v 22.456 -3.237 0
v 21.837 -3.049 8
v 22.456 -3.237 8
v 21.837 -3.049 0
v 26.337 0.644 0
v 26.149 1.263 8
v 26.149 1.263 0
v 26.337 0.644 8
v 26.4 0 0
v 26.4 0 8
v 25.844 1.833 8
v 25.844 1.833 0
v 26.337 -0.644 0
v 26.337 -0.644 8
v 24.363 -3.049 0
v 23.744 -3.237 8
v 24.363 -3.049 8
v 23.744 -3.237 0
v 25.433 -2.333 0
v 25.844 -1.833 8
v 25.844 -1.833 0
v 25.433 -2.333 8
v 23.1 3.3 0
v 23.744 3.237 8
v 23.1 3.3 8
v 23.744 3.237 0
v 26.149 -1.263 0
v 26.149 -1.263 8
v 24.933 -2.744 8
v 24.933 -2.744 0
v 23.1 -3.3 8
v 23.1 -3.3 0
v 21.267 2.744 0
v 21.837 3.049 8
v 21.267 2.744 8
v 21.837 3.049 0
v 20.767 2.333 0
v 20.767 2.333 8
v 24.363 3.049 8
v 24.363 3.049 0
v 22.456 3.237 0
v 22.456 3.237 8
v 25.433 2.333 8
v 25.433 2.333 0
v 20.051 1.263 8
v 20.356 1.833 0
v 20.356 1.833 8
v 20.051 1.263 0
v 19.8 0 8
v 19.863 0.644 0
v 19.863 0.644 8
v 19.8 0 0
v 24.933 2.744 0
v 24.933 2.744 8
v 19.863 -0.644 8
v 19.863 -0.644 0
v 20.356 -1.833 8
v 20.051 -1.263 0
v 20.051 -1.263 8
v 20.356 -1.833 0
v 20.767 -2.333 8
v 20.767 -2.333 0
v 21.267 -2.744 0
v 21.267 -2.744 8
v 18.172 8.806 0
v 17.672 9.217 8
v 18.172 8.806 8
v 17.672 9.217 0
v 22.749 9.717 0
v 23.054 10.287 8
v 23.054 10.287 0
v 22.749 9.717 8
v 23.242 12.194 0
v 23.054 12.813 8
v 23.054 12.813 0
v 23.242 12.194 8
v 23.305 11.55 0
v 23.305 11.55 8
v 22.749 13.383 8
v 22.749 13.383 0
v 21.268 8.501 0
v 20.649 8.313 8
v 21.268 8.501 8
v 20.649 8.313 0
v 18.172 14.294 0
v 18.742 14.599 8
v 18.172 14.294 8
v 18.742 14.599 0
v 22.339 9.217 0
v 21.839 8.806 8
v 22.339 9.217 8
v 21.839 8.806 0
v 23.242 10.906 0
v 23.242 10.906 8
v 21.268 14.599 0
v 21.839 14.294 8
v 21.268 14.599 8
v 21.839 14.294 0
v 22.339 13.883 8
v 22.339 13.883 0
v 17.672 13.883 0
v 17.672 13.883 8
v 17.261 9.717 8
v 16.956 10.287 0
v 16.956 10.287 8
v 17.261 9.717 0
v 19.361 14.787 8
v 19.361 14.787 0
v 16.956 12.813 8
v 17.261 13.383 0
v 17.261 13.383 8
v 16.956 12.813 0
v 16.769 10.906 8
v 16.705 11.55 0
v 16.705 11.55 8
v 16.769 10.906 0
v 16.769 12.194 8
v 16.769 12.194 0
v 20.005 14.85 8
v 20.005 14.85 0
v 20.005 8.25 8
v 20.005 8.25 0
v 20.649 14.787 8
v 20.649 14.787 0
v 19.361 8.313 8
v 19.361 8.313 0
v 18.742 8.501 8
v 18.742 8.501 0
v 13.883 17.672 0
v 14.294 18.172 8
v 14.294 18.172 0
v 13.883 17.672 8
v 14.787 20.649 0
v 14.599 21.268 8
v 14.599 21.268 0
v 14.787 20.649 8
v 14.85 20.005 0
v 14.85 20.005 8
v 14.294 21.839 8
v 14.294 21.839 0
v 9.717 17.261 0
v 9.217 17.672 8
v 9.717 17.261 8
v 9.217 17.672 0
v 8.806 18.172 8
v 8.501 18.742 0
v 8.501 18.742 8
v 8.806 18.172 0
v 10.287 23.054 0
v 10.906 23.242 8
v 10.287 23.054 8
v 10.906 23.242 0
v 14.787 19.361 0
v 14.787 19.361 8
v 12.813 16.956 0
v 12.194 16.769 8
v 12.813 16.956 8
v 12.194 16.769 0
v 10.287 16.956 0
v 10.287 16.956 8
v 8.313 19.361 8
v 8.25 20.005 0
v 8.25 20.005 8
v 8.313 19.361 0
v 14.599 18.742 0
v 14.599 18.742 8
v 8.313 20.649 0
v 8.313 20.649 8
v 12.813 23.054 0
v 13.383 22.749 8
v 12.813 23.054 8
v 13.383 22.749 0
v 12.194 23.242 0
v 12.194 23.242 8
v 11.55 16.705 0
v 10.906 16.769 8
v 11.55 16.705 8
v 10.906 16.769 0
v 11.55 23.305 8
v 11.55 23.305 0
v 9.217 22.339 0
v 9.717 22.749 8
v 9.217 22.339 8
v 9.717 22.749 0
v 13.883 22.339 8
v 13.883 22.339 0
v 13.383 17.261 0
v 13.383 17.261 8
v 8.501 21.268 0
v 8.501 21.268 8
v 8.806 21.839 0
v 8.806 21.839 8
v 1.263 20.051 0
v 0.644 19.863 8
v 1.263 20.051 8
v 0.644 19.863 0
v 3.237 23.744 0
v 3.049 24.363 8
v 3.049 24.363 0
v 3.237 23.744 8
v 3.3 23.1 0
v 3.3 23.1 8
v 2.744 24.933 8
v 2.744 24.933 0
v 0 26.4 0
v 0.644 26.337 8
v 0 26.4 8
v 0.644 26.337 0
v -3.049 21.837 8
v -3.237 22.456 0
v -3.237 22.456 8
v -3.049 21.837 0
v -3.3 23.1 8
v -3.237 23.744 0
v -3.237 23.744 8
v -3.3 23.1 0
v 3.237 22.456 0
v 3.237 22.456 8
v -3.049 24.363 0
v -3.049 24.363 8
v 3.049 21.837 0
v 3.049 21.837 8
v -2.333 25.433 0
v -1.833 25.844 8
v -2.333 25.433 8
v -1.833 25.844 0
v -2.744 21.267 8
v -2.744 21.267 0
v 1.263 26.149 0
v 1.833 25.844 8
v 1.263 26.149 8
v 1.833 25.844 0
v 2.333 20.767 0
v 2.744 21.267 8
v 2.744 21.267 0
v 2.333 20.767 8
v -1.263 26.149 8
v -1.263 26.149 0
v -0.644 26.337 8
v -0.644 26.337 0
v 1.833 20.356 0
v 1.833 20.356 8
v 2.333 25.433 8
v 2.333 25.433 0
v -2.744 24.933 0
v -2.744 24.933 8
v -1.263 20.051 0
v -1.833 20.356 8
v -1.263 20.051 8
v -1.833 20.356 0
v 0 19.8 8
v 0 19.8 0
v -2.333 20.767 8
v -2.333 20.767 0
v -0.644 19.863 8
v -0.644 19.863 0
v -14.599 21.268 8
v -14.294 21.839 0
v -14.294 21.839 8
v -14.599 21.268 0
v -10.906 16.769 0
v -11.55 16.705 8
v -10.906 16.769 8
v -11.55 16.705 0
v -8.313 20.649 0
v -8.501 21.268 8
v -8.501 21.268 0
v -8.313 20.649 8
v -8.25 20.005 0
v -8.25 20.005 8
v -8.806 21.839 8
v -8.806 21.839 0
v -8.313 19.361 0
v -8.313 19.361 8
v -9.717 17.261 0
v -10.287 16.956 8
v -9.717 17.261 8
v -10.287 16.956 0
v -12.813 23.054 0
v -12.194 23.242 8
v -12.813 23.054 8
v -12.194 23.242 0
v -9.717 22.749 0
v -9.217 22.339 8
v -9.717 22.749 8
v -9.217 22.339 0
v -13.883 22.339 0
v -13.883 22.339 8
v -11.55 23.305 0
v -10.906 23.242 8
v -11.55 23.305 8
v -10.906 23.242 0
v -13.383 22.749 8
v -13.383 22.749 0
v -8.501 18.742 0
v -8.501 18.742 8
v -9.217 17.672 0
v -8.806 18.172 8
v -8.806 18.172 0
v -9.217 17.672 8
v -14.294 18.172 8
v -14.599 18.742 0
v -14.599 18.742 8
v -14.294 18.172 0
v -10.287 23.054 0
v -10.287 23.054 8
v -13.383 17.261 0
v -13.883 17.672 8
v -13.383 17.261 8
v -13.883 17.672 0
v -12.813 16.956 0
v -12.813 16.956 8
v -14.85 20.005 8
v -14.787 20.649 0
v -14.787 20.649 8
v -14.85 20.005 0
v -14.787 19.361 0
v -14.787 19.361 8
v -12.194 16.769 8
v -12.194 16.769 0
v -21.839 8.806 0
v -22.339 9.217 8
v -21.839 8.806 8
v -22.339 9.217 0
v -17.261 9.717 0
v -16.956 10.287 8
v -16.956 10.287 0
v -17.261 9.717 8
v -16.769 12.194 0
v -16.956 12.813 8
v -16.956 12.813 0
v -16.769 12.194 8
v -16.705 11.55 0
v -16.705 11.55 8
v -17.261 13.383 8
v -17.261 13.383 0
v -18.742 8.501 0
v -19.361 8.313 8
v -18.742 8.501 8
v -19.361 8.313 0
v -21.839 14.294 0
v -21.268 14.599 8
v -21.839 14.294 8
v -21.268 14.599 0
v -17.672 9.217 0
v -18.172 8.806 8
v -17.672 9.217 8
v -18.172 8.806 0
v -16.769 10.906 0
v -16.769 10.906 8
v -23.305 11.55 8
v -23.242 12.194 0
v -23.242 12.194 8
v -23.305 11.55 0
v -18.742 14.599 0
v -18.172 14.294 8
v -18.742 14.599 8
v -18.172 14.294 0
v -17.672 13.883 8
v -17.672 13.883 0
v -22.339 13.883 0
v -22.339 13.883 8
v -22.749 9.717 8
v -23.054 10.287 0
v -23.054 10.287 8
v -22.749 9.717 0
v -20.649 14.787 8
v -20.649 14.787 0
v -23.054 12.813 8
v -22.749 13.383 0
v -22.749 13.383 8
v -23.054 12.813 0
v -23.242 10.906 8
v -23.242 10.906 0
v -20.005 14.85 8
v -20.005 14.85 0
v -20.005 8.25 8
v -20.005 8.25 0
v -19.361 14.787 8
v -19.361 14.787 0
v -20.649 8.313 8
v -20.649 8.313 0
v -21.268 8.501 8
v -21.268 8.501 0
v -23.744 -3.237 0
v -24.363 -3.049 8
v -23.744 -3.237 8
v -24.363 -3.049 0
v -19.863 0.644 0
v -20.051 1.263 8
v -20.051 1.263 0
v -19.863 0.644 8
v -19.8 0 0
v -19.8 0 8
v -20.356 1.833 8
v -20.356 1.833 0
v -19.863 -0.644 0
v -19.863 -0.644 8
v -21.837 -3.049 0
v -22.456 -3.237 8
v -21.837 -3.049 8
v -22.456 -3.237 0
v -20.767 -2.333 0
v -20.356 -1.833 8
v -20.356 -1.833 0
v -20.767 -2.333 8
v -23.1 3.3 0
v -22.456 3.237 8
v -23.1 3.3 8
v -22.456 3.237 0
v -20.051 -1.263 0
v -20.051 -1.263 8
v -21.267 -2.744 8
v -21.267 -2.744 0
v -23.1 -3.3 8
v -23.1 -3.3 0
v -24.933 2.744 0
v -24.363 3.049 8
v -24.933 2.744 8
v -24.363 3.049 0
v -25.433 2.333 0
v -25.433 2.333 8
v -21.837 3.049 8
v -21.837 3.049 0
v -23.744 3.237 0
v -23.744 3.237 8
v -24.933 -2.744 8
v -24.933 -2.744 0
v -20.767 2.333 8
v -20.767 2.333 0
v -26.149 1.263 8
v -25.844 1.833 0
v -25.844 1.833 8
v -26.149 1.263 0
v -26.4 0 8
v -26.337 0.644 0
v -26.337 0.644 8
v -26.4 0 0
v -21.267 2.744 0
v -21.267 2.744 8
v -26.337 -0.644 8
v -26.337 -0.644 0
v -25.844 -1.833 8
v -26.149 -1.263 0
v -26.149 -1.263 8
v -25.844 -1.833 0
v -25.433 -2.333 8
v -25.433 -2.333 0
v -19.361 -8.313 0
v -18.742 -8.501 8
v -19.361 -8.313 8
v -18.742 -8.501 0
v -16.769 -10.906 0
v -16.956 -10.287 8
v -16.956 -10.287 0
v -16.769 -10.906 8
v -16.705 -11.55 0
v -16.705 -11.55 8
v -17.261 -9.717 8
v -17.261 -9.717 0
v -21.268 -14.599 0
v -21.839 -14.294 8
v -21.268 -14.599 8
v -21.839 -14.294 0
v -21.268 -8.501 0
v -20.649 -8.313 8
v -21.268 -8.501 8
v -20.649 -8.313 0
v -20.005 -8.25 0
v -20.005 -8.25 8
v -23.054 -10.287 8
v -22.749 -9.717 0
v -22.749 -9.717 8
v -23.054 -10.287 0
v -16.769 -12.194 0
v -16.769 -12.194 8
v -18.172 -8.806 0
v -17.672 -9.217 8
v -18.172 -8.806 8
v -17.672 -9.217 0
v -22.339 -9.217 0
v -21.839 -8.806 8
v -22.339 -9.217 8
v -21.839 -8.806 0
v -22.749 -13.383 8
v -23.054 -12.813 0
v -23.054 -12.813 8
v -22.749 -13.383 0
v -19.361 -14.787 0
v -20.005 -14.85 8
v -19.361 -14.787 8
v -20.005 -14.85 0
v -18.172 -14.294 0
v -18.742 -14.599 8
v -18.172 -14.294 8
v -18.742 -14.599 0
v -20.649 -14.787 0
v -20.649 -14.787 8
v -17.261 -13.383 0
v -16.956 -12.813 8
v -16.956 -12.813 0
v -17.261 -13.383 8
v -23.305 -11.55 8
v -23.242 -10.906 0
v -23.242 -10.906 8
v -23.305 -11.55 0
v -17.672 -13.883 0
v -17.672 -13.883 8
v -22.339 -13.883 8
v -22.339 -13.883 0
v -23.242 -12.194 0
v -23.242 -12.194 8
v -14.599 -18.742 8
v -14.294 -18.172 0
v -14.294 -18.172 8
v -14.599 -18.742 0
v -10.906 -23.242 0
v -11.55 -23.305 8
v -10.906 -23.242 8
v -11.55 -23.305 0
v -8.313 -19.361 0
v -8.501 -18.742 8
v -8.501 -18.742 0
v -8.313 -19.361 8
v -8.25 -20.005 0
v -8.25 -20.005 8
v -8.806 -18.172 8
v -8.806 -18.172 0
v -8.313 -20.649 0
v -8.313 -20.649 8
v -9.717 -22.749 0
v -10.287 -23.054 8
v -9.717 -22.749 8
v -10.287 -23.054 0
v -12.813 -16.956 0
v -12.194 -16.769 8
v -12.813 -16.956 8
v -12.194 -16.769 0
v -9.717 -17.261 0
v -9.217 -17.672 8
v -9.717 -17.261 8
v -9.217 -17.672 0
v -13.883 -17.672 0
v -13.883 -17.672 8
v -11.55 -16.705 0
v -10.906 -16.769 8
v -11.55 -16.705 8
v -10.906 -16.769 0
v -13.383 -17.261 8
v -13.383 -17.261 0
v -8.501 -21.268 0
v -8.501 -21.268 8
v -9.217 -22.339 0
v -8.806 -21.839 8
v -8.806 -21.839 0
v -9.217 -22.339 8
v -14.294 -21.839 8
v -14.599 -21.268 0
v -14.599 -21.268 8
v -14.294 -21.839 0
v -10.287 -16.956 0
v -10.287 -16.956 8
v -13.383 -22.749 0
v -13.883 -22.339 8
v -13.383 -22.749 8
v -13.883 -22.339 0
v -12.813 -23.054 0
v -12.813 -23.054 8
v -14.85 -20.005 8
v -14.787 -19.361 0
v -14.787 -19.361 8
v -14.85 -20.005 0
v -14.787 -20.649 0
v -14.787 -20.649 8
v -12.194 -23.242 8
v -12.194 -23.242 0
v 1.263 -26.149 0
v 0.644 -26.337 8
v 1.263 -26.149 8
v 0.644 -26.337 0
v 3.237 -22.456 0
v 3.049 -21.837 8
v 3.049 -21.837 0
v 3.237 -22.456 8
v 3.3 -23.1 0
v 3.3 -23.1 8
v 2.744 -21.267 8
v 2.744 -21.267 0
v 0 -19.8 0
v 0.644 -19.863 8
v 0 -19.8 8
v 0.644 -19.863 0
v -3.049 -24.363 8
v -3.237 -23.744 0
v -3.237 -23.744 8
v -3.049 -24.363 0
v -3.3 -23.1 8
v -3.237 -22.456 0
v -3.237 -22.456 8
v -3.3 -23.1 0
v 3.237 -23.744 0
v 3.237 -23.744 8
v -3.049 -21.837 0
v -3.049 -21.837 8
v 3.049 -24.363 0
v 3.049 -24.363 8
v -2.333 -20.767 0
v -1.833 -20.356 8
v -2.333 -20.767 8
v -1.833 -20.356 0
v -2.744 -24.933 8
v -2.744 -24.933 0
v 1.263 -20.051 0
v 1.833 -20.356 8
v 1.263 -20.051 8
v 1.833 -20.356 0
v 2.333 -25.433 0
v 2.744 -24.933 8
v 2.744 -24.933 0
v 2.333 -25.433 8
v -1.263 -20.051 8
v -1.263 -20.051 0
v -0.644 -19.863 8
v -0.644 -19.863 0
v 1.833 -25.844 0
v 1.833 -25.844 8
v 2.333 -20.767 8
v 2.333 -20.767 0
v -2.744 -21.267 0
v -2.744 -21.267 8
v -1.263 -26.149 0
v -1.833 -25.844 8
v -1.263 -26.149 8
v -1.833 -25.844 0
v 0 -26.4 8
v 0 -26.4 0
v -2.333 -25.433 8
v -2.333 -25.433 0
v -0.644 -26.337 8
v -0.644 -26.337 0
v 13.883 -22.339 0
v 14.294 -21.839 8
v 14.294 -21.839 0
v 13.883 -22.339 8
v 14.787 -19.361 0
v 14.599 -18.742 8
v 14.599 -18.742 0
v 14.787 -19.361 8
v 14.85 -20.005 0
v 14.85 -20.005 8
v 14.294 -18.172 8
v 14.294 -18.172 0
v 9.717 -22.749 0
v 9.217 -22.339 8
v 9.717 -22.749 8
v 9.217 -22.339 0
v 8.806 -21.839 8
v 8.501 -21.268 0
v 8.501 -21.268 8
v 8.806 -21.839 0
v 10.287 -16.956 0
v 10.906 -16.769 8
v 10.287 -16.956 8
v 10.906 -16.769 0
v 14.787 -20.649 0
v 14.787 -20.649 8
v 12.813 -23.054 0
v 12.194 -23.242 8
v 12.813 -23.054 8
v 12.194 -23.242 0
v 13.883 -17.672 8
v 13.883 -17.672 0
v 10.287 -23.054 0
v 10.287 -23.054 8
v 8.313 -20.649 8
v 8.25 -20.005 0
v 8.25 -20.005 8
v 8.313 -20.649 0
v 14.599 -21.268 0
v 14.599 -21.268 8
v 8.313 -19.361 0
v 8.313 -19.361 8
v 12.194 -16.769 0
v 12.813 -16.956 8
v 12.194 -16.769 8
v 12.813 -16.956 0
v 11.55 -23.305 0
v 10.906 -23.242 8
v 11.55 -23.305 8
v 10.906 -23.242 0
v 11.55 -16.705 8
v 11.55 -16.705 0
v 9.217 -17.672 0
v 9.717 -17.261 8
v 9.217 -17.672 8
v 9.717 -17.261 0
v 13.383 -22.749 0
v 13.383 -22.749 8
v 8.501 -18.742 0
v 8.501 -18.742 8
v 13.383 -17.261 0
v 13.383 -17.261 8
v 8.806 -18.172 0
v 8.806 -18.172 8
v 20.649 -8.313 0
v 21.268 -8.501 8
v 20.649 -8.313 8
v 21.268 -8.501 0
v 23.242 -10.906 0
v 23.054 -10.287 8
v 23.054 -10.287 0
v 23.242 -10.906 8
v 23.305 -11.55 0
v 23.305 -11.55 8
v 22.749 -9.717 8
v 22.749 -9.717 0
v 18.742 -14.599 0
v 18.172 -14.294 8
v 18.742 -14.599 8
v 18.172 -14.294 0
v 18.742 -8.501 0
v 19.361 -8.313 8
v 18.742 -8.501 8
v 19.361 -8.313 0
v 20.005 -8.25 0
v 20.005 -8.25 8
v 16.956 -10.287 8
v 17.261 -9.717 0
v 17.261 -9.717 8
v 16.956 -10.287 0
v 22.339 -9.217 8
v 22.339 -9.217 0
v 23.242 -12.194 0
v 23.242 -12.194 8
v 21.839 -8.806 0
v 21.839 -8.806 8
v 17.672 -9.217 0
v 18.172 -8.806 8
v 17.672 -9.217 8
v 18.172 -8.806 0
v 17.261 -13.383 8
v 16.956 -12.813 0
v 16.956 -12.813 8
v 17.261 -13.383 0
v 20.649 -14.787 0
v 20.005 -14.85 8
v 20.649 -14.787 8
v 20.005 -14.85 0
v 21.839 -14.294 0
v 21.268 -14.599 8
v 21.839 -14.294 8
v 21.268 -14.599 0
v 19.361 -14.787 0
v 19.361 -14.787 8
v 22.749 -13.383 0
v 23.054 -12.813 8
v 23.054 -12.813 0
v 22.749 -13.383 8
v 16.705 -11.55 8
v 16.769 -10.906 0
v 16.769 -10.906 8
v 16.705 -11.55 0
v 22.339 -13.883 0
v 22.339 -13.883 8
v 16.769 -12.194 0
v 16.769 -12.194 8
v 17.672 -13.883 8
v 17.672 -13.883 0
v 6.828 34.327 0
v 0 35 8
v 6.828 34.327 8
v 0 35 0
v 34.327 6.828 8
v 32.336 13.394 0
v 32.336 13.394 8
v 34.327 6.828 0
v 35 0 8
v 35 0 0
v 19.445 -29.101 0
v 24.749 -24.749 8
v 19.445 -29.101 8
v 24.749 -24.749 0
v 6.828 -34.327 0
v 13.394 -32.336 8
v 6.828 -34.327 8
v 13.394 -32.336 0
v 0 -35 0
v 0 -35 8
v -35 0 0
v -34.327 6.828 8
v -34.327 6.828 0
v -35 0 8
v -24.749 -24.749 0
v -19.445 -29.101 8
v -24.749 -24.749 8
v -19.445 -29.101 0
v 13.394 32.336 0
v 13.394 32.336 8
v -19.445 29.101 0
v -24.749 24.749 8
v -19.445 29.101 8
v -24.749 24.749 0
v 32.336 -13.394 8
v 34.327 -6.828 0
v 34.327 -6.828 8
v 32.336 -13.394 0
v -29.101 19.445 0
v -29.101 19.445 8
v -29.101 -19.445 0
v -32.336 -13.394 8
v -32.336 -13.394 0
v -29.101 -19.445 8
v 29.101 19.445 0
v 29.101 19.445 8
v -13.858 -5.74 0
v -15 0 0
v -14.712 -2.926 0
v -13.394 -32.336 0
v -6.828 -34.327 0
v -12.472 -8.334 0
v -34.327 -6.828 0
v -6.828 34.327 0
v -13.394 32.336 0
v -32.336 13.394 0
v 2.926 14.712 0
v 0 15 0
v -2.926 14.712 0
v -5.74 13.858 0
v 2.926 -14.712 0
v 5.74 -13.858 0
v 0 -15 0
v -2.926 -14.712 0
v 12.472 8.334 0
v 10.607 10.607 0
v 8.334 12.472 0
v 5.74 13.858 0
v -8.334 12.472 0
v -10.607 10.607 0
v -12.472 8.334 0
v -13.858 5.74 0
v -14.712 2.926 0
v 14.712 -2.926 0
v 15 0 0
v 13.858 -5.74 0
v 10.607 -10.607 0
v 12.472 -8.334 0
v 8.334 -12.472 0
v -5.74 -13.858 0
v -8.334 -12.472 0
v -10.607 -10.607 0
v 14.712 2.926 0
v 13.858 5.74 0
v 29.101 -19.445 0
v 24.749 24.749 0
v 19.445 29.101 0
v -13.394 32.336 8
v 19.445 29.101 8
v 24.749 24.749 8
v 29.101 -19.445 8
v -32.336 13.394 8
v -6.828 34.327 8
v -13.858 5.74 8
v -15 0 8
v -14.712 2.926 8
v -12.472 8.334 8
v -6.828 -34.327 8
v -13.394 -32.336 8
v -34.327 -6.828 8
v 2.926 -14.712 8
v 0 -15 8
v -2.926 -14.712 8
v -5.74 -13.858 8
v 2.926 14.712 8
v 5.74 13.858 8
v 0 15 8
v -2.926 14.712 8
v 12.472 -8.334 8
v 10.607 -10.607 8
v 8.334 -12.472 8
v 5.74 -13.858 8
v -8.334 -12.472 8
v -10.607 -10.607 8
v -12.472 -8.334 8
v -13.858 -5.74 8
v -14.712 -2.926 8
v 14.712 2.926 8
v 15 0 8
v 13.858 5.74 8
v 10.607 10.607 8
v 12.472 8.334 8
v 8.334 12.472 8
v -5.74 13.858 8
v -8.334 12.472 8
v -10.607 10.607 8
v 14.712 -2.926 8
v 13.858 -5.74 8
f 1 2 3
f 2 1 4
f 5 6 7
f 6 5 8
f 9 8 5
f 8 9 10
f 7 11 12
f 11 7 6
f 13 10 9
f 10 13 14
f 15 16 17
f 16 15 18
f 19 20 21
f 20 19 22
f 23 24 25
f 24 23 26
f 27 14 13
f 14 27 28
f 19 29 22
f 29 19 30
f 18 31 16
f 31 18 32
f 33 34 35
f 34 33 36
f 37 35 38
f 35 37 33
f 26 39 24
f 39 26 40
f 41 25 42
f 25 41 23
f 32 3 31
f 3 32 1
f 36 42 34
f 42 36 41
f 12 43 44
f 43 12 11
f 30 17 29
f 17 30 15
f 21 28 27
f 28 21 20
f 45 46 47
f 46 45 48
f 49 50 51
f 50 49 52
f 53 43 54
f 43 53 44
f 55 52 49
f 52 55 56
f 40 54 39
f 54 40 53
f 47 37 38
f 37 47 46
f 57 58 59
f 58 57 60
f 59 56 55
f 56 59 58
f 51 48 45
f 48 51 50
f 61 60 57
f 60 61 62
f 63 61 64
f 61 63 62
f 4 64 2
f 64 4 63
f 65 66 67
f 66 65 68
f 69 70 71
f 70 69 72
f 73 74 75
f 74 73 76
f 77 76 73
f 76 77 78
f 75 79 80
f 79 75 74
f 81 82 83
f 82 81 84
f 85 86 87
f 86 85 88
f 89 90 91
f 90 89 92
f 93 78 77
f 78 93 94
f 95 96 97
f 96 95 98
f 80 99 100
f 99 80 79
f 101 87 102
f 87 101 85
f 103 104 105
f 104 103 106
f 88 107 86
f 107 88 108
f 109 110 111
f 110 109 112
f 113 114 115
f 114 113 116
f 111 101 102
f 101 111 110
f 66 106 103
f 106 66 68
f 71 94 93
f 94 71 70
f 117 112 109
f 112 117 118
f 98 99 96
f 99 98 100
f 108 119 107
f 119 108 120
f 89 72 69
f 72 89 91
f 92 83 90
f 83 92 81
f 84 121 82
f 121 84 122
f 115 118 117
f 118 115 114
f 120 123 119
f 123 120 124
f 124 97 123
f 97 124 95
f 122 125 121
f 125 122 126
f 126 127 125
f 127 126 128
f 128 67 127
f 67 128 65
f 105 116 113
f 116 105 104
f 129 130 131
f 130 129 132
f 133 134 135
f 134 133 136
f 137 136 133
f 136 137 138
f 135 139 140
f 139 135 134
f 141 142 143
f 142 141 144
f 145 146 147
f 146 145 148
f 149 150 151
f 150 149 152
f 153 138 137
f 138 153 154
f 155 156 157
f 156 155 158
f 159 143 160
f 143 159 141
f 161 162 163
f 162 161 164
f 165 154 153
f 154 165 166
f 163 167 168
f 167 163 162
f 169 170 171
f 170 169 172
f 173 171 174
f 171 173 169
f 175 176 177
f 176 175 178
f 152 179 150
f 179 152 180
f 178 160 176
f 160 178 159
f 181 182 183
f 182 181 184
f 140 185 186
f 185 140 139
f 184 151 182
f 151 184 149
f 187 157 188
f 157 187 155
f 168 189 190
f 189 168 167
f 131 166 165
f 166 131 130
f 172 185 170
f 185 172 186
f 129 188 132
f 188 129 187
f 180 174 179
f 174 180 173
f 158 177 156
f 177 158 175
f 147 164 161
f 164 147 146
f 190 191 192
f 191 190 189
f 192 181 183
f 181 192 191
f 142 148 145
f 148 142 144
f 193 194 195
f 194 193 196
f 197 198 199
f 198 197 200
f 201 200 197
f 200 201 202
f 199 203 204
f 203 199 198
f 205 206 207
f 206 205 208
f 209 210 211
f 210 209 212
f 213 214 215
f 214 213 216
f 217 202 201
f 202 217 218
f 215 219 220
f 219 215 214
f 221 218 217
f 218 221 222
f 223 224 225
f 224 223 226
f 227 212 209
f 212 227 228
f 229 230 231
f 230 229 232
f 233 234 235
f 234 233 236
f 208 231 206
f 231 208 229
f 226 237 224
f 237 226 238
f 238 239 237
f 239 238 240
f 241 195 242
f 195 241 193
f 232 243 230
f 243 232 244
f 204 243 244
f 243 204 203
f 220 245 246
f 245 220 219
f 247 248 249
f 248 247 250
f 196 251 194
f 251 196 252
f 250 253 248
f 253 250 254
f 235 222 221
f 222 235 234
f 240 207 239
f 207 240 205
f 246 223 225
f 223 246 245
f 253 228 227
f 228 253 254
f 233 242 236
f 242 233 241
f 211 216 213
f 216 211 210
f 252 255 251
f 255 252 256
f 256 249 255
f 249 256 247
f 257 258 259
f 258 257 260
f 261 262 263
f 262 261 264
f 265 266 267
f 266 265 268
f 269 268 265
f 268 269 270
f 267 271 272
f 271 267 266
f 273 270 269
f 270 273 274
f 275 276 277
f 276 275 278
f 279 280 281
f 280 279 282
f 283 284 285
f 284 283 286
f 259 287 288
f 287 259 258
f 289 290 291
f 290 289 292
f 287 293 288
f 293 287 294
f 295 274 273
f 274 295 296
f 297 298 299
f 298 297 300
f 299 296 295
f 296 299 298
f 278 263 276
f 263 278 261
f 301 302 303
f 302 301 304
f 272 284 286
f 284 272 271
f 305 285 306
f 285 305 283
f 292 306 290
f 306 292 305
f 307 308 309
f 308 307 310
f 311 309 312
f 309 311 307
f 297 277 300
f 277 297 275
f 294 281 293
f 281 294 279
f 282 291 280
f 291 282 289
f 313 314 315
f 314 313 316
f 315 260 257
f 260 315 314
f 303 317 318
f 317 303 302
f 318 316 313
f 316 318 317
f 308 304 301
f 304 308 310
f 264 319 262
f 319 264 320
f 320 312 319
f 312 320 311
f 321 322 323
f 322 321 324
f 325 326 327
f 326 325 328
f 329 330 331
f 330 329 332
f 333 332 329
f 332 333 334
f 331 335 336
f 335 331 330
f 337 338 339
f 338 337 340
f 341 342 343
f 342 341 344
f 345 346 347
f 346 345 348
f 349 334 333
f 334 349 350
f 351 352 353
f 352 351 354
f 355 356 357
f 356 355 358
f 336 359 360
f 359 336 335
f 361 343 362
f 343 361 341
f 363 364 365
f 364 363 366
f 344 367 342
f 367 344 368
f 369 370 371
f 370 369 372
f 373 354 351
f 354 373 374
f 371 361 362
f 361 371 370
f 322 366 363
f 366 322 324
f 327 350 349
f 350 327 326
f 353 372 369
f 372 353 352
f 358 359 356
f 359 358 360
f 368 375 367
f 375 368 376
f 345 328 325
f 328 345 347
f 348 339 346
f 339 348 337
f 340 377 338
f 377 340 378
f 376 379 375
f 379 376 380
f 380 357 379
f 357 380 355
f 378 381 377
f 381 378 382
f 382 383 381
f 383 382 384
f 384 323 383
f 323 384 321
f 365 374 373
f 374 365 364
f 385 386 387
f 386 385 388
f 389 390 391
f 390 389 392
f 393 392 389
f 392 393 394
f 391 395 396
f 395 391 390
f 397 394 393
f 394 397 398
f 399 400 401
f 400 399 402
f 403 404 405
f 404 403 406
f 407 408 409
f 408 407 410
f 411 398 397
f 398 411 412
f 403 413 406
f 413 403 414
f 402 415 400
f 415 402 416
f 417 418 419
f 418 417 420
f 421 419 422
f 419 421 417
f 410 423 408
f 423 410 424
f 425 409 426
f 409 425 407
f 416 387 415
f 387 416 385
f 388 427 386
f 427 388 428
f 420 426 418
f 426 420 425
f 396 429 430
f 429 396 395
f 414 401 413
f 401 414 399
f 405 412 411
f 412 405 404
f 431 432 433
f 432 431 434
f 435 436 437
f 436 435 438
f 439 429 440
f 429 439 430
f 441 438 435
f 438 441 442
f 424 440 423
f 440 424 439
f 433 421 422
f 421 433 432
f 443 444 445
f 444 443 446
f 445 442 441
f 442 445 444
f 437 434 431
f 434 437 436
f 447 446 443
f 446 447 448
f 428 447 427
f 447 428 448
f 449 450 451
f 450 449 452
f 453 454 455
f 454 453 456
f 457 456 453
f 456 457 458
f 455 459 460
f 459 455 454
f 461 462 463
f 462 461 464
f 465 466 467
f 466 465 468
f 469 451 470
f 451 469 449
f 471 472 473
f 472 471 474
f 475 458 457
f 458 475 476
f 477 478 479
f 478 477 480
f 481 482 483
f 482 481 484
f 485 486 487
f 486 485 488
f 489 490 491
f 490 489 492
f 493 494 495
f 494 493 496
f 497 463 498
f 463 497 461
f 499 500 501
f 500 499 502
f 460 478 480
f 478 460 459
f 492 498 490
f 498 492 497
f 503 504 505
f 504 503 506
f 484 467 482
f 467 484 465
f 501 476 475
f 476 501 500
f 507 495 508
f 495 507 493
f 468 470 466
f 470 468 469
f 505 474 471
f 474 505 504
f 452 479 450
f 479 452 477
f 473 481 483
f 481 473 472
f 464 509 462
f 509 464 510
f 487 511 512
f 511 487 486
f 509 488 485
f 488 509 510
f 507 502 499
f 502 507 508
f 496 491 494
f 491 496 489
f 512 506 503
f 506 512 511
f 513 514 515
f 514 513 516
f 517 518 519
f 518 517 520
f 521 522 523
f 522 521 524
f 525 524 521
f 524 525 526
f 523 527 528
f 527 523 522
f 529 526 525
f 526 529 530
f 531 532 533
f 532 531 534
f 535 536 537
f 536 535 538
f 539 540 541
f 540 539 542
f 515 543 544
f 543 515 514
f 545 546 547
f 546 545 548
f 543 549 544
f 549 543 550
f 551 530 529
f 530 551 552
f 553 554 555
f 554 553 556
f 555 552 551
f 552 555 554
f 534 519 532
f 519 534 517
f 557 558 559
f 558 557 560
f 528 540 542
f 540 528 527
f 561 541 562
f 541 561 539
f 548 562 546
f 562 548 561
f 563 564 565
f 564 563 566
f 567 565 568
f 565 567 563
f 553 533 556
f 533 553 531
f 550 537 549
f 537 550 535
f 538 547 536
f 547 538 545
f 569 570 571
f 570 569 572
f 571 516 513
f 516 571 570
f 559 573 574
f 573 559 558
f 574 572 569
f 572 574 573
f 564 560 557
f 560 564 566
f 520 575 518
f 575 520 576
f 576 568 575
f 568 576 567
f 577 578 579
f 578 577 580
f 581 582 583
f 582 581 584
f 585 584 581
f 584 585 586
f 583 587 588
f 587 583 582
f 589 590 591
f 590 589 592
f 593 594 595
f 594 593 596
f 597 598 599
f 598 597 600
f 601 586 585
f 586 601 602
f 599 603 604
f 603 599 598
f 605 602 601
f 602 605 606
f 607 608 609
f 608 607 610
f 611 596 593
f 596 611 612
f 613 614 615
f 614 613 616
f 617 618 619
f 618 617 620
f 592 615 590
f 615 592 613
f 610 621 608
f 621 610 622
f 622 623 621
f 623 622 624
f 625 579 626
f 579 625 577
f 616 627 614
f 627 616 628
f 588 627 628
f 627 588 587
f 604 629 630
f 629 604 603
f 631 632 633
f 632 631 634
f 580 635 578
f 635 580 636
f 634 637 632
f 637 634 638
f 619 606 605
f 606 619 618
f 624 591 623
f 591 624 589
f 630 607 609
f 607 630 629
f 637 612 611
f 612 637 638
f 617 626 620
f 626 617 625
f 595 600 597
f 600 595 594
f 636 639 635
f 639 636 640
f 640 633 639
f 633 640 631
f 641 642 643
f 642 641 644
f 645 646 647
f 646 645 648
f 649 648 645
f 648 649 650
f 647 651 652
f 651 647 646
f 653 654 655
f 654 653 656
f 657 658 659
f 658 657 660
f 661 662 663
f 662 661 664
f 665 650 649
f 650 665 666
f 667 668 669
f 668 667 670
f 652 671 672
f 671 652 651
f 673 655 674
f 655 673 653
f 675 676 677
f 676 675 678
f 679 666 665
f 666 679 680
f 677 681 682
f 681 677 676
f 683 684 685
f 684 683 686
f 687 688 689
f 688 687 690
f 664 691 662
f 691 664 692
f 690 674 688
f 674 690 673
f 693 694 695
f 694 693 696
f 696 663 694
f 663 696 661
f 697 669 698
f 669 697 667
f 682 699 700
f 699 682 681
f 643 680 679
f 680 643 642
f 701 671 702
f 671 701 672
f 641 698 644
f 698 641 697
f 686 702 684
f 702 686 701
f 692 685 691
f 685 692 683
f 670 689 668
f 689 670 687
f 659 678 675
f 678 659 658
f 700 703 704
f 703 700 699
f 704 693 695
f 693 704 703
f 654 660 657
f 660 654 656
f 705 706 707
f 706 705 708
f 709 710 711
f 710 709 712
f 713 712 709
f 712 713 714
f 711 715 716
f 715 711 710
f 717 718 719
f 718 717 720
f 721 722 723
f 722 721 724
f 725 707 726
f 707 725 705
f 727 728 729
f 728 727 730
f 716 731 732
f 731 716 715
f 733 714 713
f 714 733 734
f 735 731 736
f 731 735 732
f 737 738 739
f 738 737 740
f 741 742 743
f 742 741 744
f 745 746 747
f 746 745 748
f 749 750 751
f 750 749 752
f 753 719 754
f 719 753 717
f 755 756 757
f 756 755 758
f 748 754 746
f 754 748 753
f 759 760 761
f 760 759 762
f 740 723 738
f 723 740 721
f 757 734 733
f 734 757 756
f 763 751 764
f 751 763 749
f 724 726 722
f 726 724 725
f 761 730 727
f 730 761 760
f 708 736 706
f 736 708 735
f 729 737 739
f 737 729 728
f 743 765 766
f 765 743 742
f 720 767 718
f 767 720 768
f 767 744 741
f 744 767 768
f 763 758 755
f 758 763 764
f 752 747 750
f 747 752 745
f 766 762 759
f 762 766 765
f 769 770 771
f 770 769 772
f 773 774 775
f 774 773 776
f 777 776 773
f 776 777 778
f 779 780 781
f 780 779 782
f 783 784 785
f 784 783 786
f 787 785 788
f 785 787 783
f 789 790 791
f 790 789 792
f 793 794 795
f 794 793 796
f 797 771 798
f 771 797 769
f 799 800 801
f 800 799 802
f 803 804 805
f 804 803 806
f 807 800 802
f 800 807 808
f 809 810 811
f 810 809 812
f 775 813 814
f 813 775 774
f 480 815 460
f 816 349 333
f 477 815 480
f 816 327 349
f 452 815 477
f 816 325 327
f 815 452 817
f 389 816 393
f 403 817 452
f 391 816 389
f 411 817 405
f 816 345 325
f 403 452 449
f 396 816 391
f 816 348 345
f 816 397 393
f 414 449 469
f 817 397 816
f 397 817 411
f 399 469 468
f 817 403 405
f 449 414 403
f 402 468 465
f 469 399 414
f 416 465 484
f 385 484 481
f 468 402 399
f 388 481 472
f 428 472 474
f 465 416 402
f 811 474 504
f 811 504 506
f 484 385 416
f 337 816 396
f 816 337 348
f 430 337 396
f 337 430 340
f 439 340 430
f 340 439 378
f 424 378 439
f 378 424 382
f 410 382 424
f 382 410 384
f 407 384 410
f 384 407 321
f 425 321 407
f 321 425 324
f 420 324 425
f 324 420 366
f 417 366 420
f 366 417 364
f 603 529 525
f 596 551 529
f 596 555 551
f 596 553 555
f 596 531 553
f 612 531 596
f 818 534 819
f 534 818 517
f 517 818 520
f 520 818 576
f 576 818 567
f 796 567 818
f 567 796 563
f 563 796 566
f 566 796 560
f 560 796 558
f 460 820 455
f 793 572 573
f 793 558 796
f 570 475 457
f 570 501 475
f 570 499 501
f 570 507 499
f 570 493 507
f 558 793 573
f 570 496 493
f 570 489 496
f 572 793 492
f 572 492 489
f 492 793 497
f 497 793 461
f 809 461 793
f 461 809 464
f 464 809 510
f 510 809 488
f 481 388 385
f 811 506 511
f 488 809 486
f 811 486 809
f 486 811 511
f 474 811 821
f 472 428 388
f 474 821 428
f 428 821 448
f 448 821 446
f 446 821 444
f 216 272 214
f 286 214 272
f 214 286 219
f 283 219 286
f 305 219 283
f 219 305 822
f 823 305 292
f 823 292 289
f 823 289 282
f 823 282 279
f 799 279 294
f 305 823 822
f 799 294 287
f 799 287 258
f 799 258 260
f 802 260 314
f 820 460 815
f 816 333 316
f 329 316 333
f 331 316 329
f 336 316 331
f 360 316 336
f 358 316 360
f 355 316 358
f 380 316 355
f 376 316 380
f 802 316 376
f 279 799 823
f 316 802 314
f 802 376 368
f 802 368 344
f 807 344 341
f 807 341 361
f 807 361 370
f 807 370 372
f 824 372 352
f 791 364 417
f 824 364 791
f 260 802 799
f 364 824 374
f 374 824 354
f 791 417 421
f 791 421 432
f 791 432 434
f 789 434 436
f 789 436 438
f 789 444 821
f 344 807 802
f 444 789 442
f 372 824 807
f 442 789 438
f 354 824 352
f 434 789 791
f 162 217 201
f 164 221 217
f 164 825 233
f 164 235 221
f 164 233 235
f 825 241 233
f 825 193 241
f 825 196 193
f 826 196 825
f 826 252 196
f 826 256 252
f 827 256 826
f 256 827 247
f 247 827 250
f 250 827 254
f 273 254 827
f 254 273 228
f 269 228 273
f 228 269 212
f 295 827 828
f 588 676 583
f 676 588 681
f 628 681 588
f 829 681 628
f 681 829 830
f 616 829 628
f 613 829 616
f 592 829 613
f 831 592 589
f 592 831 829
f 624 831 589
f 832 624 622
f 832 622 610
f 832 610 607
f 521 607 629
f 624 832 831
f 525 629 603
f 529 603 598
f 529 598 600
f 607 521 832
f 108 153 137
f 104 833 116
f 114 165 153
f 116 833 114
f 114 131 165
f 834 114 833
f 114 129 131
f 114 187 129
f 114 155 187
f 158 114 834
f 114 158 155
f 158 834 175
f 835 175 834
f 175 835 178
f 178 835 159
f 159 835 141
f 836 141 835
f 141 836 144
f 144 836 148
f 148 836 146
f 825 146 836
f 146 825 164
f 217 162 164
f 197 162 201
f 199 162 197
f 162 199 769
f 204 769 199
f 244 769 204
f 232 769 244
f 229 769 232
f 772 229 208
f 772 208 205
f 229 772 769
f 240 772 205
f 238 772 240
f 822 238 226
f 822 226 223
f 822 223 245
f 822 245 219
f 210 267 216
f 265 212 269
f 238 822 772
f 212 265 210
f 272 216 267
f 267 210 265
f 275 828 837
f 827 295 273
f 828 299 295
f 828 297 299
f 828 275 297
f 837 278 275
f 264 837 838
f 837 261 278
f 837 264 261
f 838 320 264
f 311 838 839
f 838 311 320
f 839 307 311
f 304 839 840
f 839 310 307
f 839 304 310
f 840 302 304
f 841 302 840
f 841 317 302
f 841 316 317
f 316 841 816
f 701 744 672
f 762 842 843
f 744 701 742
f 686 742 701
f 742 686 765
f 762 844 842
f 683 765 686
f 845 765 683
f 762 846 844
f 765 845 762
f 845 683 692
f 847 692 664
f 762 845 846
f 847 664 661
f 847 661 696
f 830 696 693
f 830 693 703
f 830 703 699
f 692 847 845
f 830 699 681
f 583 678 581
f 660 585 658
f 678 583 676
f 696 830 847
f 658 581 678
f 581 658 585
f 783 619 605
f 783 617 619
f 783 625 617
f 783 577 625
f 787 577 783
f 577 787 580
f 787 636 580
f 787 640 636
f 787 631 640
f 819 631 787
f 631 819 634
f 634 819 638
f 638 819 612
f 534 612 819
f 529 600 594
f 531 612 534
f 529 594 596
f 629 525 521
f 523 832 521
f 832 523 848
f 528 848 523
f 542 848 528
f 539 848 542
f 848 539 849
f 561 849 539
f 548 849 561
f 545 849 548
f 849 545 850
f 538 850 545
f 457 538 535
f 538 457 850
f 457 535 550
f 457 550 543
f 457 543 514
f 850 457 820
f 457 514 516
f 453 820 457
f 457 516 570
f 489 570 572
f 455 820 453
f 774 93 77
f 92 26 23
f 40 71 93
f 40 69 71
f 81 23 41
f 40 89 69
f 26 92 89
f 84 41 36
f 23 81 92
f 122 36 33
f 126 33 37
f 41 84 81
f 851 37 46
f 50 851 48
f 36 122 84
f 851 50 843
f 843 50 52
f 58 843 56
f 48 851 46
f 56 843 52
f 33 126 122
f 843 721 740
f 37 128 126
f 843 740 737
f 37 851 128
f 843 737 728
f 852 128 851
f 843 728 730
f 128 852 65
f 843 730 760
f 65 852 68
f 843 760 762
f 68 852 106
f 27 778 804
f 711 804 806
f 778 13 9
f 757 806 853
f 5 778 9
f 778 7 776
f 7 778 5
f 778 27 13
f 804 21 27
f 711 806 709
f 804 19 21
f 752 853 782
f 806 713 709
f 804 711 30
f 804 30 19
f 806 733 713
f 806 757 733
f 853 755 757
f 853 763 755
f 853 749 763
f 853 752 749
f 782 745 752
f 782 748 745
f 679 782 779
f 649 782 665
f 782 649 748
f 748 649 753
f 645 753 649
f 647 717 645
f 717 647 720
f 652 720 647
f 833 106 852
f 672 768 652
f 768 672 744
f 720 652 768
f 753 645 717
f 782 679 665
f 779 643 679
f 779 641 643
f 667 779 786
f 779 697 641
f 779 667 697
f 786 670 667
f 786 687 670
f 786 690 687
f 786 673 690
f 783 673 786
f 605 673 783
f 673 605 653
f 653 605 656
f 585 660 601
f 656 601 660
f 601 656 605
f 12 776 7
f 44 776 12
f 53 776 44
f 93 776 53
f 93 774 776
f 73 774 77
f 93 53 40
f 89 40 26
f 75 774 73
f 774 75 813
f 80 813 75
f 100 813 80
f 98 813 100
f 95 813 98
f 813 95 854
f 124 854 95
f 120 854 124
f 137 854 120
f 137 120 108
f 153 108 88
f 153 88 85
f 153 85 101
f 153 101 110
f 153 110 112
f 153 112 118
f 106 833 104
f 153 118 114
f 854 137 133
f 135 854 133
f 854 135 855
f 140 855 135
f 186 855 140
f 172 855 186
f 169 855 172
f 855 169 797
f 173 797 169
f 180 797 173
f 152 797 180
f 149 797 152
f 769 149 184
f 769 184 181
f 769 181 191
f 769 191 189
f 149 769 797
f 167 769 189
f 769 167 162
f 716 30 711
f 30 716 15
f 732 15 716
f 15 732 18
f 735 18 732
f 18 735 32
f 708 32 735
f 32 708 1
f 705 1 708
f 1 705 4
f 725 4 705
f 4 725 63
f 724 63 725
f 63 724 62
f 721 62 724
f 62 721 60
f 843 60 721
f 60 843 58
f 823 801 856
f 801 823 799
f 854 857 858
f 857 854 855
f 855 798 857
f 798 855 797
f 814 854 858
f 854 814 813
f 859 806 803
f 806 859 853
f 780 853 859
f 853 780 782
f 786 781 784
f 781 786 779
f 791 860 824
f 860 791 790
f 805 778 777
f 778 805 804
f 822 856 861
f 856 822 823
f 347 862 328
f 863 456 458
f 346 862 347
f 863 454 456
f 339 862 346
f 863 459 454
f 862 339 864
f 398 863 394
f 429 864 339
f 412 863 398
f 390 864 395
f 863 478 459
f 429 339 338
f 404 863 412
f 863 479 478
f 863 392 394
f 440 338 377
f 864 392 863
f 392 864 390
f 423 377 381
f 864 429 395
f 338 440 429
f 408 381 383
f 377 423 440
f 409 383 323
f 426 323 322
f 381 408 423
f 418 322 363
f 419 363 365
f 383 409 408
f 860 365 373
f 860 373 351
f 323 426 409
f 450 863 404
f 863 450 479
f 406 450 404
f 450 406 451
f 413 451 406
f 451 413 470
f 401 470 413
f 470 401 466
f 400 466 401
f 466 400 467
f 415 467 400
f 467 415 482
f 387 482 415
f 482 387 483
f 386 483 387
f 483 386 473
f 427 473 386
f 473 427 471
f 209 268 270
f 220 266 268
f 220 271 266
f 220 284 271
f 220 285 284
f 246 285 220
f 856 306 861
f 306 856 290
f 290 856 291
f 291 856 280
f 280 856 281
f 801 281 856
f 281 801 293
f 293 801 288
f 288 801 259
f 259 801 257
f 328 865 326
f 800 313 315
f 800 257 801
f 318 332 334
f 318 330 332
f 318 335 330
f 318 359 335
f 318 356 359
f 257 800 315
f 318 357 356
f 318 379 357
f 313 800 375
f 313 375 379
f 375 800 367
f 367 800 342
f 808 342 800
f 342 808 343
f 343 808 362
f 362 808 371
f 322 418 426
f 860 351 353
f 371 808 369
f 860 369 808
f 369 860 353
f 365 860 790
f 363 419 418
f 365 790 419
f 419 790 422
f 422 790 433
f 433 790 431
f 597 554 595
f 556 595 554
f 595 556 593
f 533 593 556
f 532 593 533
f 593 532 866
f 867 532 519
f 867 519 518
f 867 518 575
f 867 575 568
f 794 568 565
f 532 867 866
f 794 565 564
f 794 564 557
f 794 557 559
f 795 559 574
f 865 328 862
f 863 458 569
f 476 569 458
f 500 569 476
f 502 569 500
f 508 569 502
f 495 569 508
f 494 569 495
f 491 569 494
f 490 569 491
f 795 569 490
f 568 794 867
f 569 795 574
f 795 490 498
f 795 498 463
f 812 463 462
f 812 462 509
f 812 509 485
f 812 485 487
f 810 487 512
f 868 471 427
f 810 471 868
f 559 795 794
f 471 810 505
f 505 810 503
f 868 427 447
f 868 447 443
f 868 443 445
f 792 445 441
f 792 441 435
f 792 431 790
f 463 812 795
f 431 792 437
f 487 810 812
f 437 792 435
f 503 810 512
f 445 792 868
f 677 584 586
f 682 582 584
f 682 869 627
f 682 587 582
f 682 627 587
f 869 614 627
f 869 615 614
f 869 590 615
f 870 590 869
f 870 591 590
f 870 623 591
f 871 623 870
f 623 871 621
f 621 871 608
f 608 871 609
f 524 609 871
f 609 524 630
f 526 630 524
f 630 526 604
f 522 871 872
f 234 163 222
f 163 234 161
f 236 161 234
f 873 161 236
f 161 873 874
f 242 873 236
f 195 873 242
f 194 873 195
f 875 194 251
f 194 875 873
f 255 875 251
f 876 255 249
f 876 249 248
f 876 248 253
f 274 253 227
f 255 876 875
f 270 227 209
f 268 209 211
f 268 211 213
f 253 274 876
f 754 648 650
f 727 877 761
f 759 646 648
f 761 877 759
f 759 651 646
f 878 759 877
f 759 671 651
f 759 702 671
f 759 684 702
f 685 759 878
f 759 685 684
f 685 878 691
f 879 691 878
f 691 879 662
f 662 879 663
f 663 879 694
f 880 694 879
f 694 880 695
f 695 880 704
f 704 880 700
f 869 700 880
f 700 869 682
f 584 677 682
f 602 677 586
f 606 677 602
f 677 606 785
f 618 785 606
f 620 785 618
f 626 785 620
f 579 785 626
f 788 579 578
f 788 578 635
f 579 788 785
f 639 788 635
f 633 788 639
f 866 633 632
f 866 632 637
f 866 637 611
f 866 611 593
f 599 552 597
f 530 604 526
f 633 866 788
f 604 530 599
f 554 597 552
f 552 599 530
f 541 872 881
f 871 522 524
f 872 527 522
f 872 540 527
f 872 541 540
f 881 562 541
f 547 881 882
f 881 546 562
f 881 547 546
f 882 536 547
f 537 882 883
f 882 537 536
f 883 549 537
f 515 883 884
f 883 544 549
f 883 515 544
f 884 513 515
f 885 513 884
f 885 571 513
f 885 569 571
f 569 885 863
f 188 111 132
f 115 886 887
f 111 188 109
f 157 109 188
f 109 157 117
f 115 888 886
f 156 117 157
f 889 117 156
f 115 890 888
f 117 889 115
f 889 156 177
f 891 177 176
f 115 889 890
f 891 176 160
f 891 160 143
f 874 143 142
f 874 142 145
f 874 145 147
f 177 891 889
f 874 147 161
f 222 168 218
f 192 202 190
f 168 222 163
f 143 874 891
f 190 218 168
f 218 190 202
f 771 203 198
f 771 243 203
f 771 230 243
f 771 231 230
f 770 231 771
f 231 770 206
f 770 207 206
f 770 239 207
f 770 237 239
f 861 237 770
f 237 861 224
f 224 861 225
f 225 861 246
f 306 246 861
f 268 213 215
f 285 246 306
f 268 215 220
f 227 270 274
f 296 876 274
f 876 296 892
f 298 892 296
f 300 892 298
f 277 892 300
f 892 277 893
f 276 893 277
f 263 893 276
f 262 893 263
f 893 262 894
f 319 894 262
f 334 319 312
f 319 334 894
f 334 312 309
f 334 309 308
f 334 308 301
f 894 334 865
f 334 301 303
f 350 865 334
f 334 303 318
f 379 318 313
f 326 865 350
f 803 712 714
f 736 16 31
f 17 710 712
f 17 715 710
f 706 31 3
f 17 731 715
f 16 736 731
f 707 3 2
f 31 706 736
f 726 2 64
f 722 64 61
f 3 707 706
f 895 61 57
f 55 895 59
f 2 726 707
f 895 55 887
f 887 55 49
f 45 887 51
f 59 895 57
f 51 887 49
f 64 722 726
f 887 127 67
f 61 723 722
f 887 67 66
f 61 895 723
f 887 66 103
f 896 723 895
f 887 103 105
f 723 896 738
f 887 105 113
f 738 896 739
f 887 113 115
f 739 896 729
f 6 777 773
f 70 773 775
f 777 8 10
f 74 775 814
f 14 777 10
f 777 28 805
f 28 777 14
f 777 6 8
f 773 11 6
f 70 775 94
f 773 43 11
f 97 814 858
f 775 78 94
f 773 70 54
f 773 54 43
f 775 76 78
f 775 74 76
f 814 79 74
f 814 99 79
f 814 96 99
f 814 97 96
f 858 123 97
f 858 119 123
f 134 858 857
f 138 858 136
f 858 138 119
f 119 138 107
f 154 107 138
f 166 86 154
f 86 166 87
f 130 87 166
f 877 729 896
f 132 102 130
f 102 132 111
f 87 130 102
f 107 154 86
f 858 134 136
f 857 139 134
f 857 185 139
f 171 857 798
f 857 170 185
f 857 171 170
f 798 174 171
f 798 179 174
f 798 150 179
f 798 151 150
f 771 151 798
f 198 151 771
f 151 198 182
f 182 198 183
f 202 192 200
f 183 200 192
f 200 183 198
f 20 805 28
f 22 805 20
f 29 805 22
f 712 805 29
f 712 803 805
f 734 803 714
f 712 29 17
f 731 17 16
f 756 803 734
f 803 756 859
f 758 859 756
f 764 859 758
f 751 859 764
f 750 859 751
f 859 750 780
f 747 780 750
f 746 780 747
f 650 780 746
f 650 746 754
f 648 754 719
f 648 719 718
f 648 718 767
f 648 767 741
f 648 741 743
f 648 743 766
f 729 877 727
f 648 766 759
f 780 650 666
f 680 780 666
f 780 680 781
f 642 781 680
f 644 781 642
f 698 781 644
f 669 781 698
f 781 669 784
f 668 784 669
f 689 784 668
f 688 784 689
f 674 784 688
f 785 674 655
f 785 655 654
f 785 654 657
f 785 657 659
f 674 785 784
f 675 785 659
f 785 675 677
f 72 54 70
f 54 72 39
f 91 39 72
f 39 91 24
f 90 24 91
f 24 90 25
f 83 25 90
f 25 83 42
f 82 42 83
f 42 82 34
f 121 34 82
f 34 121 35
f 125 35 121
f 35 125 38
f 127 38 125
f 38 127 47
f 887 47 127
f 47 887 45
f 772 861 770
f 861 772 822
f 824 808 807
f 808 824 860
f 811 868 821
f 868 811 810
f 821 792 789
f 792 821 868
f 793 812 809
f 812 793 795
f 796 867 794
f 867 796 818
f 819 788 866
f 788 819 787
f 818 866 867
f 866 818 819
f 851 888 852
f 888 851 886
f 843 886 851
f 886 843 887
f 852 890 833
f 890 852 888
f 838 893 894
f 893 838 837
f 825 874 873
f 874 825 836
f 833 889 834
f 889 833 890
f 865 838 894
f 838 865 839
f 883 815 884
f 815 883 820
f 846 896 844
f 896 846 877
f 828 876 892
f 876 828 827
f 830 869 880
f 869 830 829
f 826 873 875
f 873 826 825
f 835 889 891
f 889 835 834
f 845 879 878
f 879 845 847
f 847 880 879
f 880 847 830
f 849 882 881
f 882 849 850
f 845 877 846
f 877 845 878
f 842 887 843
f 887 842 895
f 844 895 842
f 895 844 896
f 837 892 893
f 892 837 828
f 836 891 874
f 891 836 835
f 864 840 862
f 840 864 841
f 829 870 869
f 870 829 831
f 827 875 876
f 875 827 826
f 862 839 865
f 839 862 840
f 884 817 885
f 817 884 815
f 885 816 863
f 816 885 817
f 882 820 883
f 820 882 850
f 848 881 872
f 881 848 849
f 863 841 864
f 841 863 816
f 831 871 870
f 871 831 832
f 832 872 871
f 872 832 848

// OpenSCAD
$fn = 32;

// ----------------------------------------------------------------------
// Flange Ø70 x 8
// 12 holes on a Ø46.2 bolt circle, bolted joints
// ----------------------------------------------------------------------

// --- parameters (mm) ---
flange_d = 70;  // outside diameter of the flange
thickness = 8;  // flange thickness
holes = 12;     // number of bolt holes
pcd = 46.2;     // bolt circle diameter
start_deg = 0;  // angle of the first hole, from +X
hole_d = 6.6;   // bolt hole diameter
bore_d = 30;    // central through bore
hub_d = 38;     // hub outside diameter
hub_h = 0;      // hub height above the flange face (0 = no hub)

// --- derived feature positions (mm) ---
height = thickness + hub_h;  // = 8   overall height of the part
pcd_r = pcd / 2;             // = 23.1   bolt circle radius
hole_step = 360 / holes;     // = 30   angular pitch
feature_centers = [
  [pcd_r * cos(start_deg + 0 * hole_step), pcd_r * sin(start_deg + 0 * hole_step)],
  [pcd_r * cos(start_deg + 1 * hole_step), pcd_r * sin(start_deg + 1 * hole_step)],
  [pcd_r * cos(start_deg + 2 * hole_step), pcd_r * sin(start_deg + 2 * hole_step)],
  [pcd_r * cos(start_deg + 3 * hole_step), pcd_r * sin(start_deg + 3 * hole_step)],
  [pcd_r * cos(start_deg + 4 * hole_step), pcd_r * sin(start_deg + 4 * hole_step)],
  [pcd_r * cos(start_deg + 5 * hole_step), pcd_r * sin(start_deg + 5 * hole_step)],
  [pcd_r * cos(start_deg + 6 * hole_step), pcd_r * sin(start_deg + 6 * hole_step)],
  [pcd_r * cos(start_deg + 7 * hole_step), pcd_r * sin(start_deg + 7 * hole_step)],
  [pcd_r * cos(start_deg + 8 * hole_step), pcd_r * sin(start_deg + 8 * hole_step)],
  [pcd_r * cos(start_deg + 9 * hole_step), pcd_r * sin(start_deg + 9 * hole_step)],
  [pcd_r * cos(start_deg + 10 * hole_step), pcd_r * sin(start_deg + 10 * hole_step)],
  [pcd_r * cos(start_deg + 11 * hole_step), pcd_r * sin(start_deg + 11 * hole_step)]
];   // bolt hole centres on the pitch circle

// flange disc, every hole and the bore cut straight through
difference() {
  union() {
    cylinder(d = flange_d, h = thickness);
  }
  translate([0, 0, -1]) cylinder(d = bore_d, h = height + 2);  // bore, through
  for (centre = feature_centers)
    translate([centre[0], centre[1], -1]) cylinder(d = hole_d, h = thickness + 2);
}
